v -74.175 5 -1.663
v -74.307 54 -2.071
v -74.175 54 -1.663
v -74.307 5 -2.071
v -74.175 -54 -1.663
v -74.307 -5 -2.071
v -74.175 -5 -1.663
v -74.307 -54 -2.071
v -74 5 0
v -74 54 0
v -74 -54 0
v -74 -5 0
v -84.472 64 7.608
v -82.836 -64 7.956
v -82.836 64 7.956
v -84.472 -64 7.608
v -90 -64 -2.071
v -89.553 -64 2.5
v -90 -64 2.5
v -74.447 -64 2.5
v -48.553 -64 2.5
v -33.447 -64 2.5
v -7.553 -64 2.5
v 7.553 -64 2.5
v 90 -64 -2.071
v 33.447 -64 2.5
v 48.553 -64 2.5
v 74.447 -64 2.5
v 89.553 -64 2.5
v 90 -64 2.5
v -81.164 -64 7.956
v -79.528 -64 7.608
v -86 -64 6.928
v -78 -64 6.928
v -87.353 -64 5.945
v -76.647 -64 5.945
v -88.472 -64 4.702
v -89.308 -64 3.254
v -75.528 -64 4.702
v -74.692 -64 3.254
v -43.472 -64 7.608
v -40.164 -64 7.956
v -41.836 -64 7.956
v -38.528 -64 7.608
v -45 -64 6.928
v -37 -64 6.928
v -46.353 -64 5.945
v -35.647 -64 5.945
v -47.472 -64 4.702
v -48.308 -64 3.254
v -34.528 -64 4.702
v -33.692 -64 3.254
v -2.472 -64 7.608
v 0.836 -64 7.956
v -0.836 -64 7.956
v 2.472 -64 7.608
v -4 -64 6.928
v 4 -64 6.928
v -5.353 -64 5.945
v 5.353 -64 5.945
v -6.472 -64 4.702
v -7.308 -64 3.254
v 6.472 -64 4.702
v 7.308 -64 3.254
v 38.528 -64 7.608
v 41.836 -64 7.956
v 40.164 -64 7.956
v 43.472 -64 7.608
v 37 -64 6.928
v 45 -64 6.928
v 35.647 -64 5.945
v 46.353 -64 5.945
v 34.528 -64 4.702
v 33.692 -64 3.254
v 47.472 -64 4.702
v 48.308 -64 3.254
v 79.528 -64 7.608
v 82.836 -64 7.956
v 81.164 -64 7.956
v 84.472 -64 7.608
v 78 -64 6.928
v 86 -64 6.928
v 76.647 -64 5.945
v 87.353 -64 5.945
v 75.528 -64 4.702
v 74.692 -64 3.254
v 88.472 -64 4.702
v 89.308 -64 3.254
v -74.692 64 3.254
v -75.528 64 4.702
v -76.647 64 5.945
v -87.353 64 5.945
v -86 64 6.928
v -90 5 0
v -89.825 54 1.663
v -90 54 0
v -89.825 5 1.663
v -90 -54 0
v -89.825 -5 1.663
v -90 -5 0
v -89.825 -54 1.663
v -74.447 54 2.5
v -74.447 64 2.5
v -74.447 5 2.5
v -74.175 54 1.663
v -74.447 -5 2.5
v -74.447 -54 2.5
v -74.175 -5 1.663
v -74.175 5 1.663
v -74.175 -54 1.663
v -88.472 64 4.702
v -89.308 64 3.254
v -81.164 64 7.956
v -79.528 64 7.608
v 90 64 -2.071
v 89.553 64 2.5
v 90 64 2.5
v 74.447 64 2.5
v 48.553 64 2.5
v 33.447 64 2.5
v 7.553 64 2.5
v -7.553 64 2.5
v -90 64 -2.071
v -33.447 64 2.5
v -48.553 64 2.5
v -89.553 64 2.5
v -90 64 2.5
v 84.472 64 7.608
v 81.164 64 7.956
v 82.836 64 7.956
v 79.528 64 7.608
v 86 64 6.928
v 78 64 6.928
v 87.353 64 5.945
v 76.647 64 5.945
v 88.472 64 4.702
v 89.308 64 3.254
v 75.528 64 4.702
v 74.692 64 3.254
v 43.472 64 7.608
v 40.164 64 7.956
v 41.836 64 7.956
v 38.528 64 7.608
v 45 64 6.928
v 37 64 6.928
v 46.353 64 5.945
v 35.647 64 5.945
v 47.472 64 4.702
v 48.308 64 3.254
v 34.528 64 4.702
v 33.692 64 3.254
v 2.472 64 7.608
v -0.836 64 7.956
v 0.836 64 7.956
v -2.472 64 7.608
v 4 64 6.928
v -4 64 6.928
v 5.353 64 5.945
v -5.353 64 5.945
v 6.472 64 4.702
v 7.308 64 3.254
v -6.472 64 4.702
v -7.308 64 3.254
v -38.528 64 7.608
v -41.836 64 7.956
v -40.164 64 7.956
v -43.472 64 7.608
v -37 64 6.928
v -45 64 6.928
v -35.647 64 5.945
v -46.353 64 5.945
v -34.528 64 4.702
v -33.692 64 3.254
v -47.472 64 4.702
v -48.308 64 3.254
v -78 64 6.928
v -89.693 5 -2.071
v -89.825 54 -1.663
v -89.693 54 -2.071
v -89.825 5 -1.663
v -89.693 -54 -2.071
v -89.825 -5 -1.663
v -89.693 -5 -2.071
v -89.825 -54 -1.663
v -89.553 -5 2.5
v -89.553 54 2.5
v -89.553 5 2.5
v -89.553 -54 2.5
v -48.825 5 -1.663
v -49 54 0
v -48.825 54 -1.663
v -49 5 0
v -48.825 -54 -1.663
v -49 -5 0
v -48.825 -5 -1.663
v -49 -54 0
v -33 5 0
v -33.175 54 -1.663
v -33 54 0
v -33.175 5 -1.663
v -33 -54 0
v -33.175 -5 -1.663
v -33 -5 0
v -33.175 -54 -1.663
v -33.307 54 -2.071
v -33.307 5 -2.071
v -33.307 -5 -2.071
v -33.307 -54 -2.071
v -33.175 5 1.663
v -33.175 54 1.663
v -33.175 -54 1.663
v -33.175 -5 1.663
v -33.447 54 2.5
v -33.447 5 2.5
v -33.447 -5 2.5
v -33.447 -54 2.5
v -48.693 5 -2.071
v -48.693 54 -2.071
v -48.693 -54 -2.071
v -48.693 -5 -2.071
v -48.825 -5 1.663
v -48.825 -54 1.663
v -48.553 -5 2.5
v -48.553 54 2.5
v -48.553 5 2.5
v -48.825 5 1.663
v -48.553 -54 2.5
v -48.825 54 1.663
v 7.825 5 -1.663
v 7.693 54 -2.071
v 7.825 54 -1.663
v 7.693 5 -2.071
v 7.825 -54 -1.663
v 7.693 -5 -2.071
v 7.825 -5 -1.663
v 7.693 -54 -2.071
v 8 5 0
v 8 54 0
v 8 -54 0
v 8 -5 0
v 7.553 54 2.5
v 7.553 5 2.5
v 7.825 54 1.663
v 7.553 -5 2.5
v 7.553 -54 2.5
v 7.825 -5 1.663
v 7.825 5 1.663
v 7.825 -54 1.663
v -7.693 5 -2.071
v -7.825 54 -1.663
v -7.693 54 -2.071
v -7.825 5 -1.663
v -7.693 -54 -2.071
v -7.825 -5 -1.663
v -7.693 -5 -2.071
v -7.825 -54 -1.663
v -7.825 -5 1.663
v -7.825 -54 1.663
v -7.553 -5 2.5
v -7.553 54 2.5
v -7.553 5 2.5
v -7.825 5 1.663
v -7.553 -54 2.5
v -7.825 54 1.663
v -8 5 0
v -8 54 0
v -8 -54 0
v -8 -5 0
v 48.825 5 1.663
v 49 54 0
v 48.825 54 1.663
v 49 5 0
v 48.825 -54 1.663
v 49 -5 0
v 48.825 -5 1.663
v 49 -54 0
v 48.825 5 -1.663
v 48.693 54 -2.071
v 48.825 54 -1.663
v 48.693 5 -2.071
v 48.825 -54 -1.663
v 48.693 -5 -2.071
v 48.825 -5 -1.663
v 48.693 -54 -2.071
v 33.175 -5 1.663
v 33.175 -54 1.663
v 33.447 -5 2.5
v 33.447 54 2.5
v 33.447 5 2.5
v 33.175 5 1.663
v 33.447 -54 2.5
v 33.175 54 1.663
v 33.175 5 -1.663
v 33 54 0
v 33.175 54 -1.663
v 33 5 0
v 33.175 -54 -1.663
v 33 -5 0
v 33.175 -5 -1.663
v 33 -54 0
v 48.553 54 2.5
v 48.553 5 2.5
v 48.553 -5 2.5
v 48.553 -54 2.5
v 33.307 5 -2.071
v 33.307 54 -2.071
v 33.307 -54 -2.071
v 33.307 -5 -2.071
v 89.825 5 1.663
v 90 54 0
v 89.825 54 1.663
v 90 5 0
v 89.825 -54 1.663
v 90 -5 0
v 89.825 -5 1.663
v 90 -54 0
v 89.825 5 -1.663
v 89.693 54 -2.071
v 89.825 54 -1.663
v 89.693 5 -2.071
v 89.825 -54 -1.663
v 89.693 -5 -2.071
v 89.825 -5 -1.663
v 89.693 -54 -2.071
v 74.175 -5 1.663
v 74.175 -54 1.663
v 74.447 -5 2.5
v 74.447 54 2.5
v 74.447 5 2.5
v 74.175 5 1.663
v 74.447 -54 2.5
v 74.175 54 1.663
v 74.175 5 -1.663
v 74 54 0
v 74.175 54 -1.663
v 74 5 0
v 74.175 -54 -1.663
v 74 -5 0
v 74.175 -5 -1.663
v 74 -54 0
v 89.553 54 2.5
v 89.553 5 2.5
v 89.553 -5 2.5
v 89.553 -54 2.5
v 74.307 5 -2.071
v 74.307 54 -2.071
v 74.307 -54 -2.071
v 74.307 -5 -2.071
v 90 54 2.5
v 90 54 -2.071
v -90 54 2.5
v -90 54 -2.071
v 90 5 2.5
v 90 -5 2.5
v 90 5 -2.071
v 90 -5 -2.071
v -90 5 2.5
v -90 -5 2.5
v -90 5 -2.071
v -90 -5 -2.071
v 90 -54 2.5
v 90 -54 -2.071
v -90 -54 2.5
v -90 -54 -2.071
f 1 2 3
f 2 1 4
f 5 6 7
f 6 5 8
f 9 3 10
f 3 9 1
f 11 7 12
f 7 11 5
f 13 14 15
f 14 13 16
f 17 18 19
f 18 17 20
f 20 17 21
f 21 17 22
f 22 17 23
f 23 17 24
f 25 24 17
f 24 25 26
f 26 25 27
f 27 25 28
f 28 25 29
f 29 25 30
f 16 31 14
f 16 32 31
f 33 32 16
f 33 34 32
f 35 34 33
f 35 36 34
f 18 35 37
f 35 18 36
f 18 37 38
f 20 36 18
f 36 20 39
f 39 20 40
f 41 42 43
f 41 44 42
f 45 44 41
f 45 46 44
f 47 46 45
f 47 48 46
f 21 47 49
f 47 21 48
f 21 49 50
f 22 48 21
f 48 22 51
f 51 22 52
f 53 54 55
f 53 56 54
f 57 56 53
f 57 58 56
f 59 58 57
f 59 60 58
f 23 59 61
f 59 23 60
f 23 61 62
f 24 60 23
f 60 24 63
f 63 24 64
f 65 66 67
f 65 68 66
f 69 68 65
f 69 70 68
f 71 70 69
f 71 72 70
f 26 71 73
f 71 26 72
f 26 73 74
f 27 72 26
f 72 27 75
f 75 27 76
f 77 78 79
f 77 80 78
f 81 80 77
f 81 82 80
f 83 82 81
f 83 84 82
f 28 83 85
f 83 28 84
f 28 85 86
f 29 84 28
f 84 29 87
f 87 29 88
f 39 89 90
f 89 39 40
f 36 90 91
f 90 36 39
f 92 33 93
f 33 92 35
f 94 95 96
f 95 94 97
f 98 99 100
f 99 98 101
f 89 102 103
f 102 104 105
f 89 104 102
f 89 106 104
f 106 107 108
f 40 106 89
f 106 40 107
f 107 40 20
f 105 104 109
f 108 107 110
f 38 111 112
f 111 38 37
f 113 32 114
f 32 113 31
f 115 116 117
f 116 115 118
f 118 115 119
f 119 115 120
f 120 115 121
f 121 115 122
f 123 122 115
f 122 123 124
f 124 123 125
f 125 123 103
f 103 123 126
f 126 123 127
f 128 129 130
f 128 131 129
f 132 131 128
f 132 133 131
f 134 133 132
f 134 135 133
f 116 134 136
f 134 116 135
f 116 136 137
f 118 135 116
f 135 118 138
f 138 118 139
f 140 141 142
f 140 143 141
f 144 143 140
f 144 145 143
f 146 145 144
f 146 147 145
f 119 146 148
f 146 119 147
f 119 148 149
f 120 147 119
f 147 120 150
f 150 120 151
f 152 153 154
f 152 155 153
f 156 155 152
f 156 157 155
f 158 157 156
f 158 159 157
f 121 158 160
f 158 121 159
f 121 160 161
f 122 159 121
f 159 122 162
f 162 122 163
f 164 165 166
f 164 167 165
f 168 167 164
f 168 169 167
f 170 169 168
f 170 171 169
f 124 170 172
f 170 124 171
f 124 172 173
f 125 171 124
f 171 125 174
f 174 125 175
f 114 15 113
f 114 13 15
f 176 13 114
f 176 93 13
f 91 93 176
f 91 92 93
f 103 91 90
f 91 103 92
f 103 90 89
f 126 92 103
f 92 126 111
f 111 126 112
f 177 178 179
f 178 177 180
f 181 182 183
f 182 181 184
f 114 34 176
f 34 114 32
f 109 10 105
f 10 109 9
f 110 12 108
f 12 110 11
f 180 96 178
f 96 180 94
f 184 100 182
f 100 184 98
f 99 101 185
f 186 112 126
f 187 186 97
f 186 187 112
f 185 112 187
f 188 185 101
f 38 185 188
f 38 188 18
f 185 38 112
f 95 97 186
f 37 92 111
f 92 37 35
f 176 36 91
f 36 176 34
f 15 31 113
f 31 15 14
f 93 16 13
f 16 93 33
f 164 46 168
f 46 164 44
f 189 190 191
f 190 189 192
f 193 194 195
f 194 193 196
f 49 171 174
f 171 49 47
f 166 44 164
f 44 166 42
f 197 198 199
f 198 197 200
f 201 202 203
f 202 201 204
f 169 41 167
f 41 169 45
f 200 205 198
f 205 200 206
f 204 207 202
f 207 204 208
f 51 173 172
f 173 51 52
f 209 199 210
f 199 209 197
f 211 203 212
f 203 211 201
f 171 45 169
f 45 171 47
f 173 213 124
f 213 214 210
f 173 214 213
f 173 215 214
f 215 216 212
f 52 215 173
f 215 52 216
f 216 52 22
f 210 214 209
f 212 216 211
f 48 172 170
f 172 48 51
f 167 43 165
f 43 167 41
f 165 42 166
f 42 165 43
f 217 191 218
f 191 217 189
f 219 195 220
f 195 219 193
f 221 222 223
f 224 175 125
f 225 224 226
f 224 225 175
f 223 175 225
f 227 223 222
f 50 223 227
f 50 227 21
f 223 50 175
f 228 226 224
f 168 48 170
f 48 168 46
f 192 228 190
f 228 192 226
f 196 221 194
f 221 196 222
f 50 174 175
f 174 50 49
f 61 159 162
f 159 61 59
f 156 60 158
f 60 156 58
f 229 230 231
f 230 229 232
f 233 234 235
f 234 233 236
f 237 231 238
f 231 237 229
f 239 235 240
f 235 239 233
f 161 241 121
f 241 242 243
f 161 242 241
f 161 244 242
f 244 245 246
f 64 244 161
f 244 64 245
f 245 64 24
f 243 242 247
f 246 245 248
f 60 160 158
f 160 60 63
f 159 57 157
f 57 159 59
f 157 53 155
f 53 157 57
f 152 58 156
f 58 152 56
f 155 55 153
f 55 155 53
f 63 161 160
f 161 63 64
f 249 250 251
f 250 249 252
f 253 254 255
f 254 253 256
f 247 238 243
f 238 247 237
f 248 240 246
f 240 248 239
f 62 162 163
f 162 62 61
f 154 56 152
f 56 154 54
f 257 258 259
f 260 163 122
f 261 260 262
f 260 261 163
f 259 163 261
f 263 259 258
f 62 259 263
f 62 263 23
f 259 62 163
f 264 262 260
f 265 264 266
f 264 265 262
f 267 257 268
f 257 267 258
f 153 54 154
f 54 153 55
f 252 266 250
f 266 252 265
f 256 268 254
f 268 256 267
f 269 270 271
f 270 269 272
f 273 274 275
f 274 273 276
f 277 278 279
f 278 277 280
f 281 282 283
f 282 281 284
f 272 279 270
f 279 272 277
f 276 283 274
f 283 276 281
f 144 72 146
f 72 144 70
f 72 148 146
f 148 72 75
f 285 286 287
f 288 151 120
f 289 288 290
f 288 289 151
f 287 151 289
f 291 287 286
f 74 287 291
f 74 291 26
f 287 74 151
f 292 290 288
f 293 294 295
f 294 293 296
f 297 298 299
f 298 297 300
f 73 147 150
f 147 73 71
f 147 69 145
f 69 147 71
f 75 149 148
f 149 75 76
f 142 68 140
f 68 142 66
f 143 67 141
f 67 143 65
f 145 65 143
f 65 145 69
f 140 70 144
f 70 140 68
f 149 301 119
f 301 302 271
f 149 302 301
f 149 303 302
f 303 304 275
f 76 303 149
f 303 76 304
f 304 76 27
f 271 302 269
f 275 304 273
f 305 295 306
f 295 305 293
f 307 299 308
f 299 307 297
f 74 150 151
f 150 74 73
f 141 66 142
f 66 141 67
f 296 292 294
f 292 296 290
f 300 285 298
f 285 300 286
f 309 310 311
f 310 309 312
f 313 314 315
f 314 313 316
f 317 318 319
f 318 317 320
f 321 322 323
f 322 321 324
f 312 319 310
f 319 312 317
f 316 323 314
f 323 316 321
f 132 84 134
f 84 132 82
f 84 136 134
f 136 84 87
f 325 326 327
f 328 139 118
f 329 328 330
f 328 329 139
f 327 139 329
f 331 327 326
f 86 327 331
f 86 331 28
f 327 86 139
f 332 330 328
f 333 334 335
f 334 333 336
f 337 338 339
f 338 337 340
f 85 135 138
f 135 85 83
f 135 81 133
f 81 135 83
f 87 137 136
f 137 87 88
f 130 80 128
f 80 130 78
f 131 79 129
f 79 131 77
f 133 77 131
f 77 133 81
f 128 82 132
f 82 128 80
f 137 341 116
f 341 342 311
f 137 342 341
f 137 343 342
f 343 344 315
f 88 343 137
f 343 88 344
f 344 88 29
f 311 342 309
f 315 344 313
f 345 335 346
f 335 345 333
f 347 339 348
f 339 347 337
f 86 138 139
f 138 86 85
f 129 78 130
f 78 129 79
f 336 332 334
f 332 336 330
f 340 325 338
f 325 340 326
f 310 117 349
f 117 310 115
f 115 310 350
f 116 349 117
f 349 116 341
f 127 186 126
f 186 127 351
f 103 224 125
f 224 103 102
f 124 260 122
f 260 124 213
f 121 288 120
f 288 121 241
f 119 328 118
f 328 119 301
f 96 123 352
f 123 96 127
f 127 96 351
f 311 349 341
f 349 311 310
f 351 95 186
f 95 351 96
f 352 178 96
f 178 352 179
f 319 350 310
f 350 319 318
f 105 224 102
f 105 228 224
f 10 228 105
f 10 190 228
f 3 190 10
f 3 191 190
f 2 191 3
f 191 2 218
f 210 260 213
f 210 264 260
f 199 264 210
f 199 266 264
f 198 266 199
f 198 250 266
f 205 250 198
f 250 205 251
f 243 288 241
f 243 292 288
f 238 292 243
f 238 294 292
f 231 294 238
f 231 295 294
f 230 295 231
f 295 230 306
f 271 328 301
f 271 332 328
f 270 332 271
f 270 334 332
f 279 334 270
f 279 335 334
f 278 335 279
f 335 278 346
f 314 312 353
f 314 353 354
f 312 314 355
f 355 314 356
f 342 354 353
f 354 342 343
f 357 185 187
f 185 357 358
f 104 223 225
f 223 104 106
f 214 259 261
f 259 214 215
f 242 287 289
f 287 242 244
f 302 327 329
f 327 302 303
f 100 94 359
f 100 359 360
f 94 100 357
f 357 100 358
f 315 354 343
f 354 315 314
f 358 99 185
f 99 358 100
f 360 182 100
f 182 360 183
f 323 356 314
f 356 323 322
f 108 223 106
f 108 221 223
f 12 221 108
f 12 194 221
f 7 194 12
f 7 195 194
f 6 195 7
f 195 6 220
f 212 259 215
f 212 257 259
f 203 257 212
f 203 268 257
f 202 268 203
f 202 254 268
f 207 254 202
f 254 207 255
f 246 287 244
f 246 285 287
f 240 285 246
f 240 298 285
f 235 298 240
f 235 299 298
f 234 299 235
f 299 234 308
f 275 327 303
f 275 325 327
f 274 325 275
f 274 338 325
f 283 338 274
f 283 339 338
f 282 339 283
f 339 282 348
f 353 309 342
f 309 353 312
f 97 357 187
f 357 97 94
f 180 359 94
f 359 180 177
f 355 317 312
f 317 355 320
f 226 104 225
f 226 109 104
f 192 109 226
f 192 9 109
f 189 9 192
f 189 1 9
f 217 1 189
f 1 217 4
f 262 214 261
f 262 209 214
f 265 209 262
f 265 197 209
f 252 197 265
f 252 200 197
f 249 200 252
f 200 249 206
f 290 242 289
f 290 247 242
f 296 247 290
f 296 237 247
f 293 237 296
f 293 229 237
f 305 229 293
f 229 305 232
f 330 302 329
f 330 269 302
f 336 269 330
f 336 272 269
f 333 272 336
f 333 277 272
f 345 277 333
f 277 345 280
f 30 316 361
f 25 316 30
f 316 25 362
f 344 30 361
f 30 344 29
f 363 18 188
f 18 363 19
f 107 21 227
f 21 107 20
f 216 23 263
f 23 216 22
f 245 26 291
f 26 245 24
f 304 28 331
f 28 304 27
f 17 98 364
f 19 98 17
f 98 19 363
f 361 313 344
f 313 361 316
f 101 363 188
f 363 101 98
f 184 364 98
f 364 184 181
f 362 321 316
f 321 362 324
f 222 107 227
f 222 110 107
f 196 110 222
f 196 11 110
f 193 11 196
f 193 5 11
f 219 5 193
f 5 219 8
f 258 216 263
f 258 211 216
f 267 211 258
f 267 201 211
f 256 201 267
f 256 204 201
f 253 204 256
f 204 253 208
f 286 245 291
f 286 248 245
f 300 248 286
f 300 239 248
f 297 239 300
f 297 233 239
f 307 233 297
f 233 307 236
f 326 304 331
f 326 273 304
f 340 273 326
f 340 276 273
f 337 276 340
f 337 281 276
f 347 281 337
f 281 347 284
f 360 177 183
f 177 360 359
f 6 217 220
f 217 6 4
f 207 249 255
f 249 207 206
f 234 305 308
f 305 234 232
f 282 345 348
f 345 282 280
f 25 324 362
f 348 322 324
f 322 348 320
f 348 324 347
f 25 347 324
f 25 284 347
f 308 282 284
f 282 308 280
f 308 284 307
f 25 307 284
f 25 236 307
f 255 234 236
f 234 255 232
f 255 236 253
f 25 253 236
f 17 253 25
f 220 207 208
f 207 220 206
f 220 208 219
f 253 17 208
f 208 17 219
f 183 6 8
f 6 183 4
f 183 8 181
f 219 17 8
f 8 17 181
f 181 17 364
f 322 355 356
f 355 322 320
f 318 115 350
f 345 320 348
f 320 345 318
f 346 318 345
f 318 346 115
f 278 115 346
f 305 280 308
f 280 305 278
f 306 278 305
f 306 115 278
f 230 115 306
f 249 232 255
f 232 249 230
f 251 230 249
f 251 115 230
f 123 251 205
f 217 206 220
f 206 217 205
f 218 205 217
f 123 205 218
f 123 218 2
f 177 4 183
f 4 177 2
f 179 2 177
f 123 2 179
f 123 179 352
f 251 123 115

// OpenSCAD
height = 8.0;
thick = 5.0;
width = 128.0;
length = 180.0;
base_width = 10.0;

$fn = 30;

rotate([180,0,0])
difference(){

  union(){
    for (x=[-1,-0.5,0,0.5,1]){
      rotate([90,0,0])
        translate([x*(length/2-height), 0, 0])
          cylinder(r=height, h=width, center=true);
    }
    for (y=[-1,0,1]){
      translate([0,y*(width/2-base_width/2),0])
        cube(size=[length,base_width,thick], center=true);
    }
  }

  translate([0,0,thick*sqrt(2)])
    cube(size=[length+.1,width+.1,thick*2], center=true);
}
